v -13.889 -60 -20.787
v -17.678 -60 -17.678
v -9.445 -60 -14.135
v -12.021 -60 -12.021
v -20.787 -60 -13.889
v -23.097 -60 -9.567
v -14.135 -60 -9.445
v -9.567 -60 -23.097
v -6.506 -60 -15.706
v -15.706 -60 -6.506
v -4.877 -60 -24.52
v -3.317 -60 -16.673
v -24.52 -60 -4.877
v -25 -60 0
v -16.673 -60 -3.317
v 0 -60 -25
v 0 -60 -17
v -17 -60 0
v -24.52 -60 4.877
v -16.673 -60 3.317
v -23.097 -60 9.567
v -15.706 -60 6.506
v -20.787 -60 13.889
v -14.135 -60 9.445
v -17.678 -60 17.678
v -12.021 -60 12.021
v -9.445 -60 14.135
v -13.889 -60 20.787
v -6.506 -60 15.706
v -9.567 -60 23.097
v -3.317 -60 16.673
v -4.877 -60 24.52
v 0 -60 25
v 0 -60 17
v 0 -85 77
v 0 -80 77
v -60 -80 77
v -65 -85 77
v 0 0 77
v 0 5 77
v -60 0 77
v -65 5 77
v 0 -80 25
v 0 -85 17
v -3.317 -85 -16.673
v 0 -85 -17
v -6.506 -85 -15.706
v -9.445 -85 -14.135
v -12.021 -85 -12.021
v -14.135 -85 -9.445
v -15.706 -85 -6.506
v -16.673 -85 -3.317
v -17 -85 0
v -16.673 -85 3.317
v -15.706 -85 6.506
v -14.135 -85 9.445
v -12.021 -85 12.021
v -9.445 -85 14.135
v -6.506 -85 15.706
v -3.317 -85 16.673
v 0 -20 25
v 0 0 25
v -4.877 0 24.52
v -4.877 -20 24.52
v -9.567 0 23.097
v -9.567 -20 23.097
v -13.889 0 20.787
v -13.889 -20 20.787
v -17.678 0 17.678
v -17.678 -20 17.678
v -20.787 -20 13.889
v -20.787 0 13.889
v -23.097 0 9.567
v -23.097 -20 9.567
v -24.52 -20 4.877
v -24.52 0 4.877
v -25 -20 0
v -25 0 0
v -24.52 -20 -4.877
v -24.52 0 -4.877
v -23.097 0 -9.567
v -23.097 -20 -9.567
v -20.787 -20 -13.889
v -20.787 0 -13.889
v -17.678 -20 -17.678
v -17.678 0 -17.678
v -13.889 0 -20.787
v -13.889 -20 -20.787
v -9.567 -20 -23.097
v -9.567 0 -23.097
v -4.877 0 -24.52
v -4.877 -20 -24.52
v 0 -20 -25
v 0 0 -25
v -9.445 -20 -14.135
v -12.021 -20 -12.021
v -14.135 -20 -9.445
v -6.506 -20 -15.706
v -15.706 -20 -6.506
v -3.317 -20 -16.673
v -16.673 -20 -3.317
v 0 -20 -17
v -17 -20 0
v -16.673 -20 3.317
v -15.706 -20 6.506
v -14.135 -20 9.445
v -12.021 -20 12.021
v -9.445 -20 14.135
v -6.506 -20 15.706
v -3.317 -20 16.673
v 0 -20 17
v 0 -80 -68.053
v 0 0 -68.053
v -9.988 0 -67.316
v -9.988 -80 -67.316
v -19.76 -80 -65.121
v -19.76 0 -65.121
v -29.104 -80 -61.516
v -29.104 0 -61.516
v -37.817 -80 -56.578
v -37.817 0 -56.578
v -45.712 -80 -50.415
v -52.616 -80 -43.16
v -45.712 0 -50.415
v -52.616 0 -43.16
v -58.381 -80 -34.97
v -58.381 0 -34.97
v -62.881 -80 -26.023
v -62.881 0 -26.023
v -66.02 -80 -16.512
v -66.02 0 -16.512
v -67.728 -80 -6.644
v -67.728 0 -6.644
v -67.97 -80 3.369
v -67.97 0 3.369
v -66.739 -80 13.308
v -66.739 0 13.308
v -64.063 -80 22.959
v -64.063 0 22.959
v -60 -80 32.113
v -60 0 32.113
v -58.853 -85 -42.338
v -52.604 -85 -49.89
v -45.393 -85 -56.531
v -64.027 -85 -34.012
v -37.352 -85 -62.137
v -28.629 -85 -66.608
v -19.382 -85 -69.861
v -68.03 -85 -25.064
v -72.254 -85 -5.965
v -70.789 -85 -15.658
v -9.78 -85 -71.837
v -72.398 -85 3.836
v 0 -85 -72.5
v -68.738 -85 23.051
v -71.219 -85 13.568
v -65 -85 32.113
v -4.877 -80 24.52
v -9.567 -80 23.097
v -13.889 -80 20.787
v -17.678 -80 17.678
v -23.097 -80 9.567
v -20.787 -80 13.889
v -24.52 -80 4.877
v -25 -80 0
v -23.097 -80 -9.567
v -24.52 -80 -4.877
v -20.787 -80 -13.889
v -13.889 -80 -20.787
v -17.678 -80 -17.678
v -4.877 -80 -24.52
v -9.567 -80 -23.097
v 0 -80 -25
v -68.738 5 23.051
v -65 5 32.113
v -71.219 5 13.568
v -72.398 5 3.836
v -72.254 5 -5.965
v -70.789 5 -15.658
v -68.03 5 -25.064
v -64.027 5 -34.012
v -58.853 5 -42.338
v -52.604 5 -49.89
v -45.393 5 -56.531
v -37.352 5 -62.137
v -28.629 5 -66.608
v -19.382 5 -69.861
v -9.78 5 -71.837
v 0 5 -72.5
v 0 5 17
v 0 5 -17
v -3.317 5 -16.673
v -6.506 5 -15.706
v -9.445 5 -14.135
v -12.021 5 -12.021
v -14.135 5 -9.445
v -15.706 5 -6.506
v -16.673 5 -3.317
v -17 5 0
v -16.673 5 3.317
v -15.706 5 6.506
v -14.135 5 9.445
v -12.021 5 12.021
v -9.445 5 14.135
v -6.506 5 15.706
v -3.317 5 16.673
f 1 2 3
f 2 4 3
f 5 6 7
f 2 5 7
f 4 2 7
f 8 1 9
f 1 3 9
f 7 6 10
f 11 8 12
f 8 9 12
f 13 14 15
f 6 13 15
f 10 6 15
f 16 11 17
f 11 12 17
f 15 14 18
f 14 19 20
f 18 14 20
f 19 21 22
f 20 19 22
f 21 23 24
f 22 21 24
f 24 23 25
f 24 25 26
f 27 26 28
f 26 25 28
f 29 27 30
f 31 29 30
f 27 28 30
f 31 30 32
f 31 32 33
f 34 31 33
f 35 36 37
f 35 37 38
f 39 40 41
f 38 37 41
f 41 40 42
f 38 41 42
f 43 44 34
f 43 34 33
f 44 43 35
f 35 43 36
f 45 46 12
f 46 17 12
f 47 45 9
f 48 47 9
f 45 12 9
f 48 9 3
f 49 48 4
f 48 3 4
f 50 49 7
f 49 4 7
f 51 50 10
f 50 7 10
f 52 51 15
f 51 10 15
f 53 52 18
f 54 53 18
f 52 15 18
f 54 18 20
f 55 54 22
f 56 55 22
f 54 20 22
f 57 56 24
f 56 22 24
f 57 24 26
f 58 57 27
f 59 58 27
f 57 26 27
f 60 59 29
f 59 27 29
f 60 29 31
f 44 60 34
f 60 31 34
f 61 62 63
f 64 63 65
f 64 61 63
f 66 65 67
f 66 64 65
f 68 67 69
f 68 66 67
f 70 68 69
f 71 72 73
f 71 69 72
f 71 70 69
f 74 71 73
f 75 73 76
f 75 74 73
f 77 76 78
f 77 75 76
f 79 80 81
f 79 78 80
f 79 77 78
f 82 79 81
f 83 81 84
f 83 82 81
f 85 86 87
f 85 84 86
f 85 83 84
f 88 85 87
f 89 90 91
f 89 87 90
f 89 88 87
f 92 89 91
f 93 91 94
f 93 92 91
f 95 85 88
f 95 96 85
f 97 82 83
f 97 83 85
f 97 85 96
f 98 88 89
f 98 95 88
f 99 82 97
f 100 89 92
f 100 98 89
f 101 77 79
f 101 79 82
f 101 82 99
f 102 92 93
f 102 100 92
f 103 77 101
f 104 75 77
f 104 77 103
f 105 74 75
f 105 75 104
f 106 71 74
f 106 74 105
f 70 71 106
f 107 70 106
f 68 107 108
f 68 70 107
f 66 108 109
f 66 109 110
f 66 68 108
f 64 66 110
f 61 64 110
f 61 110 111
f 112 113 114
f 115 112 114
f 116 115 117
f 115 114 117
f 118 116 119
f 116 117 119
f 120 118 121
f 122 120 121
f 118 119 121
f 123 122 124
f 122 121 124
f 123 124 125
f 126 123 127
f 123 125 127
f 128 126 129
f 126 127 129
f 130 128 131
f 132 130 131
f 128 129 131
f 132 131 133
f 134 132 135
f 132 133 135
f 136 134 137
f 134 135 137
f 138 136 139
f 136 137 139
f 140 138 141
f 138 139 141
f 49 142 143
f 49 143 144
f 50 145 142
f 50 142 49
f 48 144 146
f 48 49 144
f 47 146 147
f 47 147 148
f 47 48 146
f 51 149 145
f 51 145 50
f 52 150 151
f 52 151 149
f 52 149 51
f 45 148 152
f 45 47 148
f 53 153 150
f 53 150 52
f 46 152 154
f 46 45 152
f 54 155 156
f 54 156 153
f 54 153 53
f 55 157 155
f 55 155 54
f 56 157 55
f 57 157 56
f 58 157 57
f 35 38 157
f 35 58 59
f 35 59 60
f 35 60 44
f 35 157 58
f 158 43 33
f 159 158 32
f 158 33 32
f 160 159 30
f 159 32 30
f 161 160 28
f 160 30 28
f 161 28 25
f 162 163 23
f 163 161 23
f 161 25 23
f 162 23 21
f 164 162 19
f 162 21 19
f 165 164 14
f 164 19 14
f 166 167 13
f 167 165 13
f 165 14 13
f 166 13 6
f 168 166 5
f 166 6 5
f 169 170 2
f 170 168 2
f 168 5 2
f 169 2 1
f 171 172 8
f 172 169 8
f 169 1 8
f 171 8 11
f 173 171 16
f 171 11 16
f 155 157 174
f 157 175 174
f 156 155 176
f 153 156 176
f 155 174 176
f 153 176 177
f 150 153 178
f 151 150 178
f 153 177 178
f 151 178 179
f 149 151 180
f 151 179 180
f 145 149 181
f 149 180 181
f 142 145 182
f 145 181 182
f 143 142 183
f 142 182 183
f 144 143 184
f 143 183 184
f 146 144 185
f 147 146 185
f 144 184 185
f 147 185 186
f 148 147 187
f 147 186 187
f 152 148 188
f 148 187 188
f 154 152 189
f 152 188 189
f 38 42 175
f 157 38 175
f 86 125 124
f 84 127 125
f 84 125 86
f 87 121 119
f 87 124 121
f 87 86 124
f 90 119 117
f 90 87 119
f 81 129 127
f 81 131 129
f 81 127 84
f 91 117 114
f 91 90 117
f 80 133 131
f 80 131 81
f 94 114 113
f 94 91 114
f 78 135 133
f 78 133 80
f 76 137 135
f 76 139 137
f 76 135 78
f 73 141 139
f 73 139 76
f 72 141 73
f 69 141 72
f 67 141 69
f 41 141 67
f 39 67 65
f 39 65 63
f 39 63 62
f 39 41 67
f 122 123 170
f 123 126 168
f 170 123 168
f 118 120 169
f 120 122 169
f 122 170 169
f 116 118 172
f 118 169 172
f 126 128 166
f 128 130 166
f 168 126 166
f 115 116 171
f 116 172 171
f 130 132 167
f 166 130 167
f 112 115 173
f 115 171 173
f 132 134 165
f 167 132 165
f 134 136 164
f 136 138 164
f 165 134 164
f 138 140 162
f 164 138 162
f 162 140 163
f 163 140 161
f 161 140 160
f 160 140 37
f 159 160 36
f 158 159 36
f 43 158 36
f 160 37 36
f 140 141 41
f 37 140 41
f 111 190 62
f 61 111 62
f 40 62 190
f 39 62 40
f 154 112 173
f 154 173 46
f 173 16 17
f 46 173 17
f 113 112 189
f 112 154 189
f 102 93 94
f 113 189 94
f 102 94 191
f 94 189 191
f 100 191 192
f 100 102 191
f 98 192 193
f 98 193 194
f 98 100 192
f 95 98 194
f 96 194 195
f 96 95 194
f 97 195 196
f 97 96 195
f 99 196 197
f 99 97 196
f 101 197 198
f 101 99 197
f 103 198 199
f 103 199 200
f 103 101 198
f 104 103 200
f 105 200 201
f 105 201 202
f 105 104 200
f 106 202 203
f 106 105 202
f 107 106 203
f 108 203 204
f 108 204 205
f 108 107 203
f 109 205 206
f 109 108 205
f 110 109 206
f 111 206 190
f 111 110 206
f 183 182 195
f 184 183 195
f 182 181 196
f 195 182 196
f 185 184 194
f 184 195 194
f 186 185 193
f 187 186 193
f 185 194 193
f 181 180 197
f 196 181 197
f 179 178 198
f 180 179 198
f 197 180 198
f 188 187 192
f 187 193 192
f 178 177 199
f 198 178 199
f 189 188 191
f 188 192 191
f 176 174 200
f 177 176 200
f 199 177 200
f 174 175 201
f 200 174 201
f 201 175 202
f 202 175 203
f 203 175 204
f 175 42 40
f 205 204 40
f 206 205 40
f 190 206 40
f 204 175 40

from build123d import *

# Parameters (mm, degrees)
F1_DEPTH      = 20
F1_DEPTH_BACK = 5
F3_DEPTH      = 5
F7_DEPTH      = 80


with BuildPart() as f1:
    # F0 (on Front) → F1 (new body, two sides)
    with BuildSketch(Plane.XZ) as f1_sk:
        with BuildLine():
            Line((0, 17), (0, 25))
            ThreePointArc((0, 25), (-25, 0), (0, -25))
            Line((0, -25), (0, -17))
            ThreePointArc((0, -17), (-17, 0), (0, 17))
        make_face()
    extrude(amount=F1_DEPTH)
    extrude(f1_sk.sketch, amount=-F1_DEPTH_BACK)

    # F2 (on Front) → F3 (join)
    with BuildSketch(Plane.XZ):
        with BuildLine():
            Line((-65, 77), (-65, 32.1130814467))
            ThreePointArc((-65, 32.1130814467), (-61.5810376857, -38.2625900529), (0, -72.5))
            Line((0, -72.5), (0, -25))
            ThreePointArc((0, -25), (-25, 0), (0, 25))
            Line((0, 25), (0, 77))
            Line((0, 77), (-65, 77))
        make_face()
    extrude(amount=-F3_DEPTH)


with BuildPart() as f5_1:
    # F5: instance of F1
    add(f1.part.mirror(Plane.XZ.offset(40)))


with BuildPart() as f1_1:
    add(f1.part)

    add(f5_1.part)  # F7 merges F5_1
    # F6 (on face) → F7 (join, through all)
    with BuildSketch(Plane.XZ):
        with BuildLine():
            Line((-65, 77), (-65, 32.1130814467))
            ThreePointArc((-65, 32.1130814467), (-61.5810376857, -38.2625900529), (0, -72.5))
            Line((0, -72.5), (0, -68.0532879441))
            ThreePointArc((0, -68.0532879441), (-58.3808649236, -34.9703390142), (-60, 32.1130814467))
            Line((-60, 32.1130814467), (-60, 77))
            Line((-60, 77), (-65, 77))
        make_face()
    extrude(amount=F7_DEPTH)


solid = f1_1.part
